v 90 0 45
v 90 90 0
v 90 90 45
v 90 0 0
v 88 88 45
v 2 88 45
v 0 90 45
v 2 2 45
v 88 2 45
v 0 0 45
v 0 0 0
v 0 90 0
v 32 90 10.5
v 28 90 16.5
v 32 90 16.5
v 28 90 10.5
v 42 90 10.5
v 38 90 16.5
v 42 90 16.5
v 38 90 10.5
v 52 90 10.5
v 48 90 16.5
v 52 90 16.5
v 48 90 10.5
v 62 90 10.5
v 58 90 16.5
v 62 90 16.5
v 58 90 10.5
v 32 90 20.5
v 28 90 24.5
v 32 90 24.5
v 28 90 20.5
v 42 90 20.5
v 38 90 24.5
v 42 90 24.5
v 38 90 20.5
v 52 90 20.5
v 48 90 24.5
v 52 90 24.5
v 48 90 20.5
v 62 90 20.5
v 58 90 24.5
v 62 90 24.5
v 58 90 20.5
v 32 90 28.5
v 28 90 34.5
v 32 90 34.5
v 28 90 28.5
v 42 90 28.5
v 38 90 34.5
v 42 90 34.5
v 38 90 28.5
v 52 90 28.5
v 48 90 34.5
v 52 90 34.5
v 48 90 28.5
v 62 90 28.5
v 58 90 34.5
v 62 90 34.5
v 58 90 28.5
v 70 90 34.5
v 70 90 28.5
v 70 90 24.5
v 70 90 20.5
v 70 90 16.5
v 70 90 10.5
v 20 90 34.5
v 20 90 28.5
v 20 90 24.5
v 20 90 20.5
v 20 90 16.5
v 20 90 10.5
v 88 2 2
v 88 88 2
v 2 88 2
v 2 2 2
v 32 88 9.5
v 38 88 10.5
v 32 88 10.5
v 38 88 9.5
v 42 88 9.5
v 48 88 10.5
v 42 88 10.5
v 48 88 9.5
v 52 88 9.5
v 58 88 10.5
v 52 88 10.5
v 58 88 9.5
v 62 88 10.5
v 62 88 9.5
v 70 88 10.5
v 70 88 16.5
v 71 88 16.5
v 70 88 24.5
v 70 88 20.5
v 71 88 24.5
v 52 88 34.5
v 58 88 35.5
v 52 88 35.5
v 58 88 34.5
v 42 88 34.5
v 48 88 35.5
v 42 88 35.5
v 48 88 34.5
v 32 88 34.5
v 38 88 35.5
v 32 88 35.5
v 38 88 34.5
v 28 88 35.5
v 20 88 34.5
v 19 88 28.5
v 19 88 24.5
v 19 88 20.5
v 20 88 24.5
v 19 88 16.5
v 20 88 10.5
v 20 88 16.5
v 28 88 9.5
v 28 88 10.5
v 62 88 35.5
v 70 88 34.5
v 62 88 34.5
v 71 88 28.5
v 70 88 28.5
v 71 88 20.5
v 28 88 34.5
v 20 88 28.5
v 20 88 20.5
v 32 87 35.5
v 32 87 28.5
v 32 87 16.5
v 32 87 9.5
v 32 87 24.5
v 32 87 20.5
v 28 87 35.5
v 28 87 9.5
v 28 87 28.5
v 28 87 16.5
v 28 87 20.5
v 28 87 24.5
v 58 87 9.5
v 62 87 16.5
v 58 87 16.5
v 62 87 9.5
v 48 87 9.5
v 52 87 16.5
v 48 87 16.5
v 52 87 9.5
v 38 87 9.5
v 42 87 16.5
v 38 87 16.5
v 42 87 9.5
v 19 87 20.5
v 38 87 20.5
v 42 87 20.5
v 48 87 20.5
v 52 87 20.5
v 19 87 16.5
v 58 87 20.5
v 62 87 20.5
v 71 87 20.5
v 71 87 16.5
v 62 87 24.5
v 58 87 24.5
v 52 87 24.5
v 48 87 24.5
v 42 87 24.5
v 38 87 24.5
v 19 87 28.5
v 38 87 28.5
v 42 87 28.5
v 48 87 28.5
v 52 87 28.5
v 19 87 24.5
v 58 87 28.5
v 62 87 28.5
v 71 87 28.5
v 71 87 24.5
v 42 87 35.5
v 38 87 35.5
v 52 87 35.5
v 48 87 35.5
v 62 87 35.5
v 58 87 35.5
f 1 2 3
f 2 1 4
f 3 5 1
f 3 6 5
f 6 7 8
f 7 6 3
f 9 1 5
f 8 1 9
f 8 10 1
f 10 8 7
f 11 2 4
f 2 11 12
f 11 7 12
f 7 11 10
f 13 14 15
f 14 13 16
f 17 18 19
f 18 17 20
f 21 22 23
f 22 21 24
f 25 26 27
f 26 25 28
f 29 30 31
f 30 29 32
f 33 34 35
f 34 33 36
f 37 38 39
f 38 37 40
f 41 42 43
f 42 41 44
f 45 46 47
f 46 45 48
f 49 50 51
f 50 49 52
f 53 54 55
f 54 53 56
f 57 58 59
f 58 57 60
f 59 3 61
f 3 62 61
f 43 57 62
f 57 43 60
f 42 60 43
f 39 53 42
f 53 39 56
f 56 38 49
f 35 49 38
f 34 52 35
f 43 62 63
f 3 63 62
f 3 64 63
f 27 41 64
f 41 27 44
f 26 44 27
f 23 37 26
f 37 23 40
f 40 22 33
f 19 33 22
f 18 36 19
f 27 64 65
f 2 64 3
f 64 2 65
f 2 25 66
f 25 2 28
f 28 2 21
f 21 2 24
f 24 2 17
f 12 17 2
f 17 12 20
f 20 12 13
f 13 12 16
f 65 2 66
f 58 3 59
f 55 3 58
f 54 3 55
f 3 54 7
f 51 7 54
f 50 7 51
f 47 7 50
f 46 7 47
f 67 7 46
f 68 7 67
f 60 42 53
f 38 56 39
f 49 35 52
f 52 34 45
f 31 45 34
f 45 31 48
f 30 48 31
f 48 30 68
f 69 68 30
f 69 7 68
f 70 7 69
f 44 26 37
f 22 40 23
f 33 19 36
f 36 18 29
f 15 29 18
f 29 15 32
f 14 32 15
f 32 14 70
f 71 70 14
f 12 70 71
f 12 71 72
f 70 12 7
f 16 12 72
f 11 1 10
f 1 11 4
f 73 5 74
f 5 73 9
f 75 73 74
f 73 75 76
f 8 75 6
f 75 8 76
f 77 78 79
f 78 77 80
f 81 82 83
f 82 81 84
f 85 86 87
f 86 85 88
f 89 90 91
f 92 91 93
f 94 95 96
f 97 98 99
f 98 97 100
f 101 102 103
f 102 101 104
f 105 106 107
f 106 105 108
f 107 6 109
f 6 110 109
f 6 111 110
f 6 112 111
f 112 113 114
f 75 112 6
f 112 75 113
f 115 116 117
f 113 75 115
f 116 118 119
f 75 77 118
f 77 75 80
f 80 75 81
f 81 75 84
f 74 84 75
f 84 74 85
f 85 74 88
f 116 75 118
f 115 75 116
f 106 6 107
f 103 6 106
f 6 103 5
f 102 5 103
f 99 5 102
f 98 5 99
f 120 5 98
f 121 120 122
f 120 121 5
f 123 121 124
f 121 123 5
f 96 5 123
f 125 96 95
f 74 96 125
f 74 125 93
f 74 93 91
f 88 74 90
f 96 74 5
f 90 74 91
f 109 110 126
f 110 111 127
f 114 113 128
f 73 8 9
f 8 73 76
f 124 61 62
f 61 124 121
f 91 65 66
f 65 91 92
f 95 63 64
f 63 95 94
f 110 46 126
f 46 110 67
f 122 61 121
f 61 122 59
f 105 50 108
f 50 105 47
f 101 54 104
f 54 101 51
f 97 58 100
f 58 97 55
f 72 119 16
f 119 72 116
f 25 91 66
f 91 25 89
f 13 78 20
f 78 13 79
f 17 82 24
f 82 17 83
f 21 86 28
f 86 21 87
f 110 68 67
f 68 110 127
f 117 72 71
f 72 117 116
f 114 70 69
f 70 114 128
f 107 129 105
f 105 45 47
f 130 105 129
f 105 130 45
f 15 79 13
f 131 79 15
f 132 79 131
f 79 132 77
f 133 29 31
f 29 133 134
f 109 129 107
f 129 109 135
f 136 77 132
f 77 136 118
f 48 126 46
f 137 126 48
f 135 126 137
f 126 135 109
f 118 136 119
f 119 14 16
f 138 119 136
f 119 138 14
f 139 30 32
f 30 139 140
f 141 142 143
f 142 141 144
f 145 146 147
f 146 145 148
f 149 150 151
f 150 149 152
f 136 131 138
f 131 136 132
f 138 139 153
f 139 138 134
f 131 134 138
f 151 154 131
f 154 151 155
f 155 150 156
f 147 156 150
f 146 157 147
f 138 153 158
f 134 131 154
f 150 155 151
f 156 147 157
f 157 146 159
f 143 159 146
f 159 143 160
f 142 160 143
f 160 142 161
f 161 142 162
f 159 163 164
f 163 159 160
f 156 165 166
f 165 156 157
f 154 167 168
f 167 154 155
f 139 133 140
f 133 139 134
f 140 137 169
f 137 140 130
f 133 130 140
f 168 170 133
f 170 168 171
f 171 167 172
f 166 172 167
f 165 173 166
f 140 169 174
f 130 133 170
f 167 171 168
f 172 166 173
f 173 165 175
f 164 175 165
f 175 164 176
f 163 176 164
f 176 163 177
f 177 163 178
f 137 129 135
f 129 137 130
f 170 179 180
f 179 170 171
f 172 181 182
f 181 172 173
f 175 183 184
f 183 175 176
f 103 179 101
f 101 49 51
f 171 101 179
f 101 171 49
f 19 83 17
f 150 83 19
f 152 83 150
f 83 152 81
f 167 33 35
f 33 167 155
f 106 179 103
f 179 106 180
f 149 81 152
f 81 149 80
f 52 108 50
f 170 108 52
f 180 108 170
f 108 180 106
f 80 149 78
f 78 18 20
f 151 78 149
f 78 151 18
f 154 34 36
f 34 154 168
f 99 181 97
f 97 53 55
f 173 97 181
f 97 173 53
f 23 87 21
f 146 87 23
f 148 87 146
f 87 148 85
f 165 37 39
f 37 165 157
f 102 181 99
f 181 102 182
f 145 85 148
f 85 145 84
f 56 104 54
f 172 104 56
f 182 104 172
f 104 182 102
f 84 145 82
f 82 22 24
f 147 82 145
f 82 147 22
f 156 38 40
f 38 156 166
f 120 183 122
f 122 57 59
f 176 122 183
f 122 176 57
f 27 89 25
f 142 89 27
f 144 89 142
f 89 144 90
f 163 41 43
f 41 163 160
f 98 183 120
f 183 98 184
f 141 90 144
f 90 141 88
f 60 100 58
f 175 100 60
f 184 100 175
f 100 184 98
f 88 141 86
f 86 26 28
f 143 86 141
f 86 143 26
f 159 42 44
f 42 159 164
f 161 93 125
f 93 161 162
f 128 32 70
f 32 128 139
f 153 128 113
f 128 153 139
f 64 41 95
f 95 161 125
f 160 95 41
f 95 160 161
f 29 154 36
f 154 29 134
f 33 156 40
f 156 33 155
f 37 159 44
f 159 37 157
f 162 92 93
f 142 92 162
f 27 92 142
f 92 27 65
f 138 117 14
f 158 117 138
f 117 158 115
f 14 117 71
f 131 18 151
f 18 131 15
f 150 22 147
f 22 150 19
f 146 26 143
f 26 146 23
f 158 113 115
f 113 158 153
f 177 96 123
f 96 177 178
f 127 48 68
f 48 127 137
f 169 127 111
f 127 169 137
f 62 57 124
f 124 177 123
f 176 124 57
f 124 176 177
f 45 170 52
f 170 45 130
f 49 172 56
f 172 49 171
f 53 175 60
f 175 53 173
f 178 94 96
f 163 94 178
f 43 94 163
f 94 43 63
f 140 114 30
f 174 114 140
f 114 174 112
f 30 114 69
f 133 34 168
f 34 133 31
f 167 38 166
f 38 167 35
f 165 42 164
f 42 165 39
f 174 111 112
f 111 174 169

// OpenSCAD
$fn = 32;

// ----------------------------------------------------------------------
// Vent box: crossgrid enclosure
// ----------------------------------------------------------------------

// --- parameters (mm) ---
box_l = 90;               // box length, X
box_w = 90;               // box width, Y
box_h = 45;               // box height, Z
wall_t = 2;               // shell wall thickness
win_l = 50;               // vent window width, X
win_h = 24;               // vent window height, Z
bar_w = 4;                // grid bar width
n_v = 4;                  // vertical bar count
n_h = 2;                  // horizontal bar count

win_z0 = (box_h - win_h) / 2;  // window lower edge Z
v_step = win_l / (n_v + 1);  // vertical bar step
h_step = win_h / (n_h + 1);  // horizontal bar step

difference() {
  union() {
    difference() {
      cube([box_l, box_w, box_h]);
  translate([wall_t, wall_t, wall_t])
    cube([box_l - 2 * wall_t, box_w - 2 * wall_t, box_h]);
  translate([(box_l - win_l) / 2, box_w - wall_t - 1, win_z0])
    cube([win_l, wall_t + 2, win_h]);
    }
    for (i = [1 : n_v])
      translate([(box_l - win_l) / 2 + i * v_step - bar_w / 2,
                 box_w - wall_t - 1, win_z0 - 1])
        cube([bar_w, wall_t + 1, win_h + 2]);
    for (i = [1 : n_h])
      translate([(box_l - win_l) / 2 - 1, box_w - wall_t - 1,
                 win_z0 + i * h_step - bar_w / 2])
        cube([win_l + 2, wall_t + 1, bar_w]);
  }
}
